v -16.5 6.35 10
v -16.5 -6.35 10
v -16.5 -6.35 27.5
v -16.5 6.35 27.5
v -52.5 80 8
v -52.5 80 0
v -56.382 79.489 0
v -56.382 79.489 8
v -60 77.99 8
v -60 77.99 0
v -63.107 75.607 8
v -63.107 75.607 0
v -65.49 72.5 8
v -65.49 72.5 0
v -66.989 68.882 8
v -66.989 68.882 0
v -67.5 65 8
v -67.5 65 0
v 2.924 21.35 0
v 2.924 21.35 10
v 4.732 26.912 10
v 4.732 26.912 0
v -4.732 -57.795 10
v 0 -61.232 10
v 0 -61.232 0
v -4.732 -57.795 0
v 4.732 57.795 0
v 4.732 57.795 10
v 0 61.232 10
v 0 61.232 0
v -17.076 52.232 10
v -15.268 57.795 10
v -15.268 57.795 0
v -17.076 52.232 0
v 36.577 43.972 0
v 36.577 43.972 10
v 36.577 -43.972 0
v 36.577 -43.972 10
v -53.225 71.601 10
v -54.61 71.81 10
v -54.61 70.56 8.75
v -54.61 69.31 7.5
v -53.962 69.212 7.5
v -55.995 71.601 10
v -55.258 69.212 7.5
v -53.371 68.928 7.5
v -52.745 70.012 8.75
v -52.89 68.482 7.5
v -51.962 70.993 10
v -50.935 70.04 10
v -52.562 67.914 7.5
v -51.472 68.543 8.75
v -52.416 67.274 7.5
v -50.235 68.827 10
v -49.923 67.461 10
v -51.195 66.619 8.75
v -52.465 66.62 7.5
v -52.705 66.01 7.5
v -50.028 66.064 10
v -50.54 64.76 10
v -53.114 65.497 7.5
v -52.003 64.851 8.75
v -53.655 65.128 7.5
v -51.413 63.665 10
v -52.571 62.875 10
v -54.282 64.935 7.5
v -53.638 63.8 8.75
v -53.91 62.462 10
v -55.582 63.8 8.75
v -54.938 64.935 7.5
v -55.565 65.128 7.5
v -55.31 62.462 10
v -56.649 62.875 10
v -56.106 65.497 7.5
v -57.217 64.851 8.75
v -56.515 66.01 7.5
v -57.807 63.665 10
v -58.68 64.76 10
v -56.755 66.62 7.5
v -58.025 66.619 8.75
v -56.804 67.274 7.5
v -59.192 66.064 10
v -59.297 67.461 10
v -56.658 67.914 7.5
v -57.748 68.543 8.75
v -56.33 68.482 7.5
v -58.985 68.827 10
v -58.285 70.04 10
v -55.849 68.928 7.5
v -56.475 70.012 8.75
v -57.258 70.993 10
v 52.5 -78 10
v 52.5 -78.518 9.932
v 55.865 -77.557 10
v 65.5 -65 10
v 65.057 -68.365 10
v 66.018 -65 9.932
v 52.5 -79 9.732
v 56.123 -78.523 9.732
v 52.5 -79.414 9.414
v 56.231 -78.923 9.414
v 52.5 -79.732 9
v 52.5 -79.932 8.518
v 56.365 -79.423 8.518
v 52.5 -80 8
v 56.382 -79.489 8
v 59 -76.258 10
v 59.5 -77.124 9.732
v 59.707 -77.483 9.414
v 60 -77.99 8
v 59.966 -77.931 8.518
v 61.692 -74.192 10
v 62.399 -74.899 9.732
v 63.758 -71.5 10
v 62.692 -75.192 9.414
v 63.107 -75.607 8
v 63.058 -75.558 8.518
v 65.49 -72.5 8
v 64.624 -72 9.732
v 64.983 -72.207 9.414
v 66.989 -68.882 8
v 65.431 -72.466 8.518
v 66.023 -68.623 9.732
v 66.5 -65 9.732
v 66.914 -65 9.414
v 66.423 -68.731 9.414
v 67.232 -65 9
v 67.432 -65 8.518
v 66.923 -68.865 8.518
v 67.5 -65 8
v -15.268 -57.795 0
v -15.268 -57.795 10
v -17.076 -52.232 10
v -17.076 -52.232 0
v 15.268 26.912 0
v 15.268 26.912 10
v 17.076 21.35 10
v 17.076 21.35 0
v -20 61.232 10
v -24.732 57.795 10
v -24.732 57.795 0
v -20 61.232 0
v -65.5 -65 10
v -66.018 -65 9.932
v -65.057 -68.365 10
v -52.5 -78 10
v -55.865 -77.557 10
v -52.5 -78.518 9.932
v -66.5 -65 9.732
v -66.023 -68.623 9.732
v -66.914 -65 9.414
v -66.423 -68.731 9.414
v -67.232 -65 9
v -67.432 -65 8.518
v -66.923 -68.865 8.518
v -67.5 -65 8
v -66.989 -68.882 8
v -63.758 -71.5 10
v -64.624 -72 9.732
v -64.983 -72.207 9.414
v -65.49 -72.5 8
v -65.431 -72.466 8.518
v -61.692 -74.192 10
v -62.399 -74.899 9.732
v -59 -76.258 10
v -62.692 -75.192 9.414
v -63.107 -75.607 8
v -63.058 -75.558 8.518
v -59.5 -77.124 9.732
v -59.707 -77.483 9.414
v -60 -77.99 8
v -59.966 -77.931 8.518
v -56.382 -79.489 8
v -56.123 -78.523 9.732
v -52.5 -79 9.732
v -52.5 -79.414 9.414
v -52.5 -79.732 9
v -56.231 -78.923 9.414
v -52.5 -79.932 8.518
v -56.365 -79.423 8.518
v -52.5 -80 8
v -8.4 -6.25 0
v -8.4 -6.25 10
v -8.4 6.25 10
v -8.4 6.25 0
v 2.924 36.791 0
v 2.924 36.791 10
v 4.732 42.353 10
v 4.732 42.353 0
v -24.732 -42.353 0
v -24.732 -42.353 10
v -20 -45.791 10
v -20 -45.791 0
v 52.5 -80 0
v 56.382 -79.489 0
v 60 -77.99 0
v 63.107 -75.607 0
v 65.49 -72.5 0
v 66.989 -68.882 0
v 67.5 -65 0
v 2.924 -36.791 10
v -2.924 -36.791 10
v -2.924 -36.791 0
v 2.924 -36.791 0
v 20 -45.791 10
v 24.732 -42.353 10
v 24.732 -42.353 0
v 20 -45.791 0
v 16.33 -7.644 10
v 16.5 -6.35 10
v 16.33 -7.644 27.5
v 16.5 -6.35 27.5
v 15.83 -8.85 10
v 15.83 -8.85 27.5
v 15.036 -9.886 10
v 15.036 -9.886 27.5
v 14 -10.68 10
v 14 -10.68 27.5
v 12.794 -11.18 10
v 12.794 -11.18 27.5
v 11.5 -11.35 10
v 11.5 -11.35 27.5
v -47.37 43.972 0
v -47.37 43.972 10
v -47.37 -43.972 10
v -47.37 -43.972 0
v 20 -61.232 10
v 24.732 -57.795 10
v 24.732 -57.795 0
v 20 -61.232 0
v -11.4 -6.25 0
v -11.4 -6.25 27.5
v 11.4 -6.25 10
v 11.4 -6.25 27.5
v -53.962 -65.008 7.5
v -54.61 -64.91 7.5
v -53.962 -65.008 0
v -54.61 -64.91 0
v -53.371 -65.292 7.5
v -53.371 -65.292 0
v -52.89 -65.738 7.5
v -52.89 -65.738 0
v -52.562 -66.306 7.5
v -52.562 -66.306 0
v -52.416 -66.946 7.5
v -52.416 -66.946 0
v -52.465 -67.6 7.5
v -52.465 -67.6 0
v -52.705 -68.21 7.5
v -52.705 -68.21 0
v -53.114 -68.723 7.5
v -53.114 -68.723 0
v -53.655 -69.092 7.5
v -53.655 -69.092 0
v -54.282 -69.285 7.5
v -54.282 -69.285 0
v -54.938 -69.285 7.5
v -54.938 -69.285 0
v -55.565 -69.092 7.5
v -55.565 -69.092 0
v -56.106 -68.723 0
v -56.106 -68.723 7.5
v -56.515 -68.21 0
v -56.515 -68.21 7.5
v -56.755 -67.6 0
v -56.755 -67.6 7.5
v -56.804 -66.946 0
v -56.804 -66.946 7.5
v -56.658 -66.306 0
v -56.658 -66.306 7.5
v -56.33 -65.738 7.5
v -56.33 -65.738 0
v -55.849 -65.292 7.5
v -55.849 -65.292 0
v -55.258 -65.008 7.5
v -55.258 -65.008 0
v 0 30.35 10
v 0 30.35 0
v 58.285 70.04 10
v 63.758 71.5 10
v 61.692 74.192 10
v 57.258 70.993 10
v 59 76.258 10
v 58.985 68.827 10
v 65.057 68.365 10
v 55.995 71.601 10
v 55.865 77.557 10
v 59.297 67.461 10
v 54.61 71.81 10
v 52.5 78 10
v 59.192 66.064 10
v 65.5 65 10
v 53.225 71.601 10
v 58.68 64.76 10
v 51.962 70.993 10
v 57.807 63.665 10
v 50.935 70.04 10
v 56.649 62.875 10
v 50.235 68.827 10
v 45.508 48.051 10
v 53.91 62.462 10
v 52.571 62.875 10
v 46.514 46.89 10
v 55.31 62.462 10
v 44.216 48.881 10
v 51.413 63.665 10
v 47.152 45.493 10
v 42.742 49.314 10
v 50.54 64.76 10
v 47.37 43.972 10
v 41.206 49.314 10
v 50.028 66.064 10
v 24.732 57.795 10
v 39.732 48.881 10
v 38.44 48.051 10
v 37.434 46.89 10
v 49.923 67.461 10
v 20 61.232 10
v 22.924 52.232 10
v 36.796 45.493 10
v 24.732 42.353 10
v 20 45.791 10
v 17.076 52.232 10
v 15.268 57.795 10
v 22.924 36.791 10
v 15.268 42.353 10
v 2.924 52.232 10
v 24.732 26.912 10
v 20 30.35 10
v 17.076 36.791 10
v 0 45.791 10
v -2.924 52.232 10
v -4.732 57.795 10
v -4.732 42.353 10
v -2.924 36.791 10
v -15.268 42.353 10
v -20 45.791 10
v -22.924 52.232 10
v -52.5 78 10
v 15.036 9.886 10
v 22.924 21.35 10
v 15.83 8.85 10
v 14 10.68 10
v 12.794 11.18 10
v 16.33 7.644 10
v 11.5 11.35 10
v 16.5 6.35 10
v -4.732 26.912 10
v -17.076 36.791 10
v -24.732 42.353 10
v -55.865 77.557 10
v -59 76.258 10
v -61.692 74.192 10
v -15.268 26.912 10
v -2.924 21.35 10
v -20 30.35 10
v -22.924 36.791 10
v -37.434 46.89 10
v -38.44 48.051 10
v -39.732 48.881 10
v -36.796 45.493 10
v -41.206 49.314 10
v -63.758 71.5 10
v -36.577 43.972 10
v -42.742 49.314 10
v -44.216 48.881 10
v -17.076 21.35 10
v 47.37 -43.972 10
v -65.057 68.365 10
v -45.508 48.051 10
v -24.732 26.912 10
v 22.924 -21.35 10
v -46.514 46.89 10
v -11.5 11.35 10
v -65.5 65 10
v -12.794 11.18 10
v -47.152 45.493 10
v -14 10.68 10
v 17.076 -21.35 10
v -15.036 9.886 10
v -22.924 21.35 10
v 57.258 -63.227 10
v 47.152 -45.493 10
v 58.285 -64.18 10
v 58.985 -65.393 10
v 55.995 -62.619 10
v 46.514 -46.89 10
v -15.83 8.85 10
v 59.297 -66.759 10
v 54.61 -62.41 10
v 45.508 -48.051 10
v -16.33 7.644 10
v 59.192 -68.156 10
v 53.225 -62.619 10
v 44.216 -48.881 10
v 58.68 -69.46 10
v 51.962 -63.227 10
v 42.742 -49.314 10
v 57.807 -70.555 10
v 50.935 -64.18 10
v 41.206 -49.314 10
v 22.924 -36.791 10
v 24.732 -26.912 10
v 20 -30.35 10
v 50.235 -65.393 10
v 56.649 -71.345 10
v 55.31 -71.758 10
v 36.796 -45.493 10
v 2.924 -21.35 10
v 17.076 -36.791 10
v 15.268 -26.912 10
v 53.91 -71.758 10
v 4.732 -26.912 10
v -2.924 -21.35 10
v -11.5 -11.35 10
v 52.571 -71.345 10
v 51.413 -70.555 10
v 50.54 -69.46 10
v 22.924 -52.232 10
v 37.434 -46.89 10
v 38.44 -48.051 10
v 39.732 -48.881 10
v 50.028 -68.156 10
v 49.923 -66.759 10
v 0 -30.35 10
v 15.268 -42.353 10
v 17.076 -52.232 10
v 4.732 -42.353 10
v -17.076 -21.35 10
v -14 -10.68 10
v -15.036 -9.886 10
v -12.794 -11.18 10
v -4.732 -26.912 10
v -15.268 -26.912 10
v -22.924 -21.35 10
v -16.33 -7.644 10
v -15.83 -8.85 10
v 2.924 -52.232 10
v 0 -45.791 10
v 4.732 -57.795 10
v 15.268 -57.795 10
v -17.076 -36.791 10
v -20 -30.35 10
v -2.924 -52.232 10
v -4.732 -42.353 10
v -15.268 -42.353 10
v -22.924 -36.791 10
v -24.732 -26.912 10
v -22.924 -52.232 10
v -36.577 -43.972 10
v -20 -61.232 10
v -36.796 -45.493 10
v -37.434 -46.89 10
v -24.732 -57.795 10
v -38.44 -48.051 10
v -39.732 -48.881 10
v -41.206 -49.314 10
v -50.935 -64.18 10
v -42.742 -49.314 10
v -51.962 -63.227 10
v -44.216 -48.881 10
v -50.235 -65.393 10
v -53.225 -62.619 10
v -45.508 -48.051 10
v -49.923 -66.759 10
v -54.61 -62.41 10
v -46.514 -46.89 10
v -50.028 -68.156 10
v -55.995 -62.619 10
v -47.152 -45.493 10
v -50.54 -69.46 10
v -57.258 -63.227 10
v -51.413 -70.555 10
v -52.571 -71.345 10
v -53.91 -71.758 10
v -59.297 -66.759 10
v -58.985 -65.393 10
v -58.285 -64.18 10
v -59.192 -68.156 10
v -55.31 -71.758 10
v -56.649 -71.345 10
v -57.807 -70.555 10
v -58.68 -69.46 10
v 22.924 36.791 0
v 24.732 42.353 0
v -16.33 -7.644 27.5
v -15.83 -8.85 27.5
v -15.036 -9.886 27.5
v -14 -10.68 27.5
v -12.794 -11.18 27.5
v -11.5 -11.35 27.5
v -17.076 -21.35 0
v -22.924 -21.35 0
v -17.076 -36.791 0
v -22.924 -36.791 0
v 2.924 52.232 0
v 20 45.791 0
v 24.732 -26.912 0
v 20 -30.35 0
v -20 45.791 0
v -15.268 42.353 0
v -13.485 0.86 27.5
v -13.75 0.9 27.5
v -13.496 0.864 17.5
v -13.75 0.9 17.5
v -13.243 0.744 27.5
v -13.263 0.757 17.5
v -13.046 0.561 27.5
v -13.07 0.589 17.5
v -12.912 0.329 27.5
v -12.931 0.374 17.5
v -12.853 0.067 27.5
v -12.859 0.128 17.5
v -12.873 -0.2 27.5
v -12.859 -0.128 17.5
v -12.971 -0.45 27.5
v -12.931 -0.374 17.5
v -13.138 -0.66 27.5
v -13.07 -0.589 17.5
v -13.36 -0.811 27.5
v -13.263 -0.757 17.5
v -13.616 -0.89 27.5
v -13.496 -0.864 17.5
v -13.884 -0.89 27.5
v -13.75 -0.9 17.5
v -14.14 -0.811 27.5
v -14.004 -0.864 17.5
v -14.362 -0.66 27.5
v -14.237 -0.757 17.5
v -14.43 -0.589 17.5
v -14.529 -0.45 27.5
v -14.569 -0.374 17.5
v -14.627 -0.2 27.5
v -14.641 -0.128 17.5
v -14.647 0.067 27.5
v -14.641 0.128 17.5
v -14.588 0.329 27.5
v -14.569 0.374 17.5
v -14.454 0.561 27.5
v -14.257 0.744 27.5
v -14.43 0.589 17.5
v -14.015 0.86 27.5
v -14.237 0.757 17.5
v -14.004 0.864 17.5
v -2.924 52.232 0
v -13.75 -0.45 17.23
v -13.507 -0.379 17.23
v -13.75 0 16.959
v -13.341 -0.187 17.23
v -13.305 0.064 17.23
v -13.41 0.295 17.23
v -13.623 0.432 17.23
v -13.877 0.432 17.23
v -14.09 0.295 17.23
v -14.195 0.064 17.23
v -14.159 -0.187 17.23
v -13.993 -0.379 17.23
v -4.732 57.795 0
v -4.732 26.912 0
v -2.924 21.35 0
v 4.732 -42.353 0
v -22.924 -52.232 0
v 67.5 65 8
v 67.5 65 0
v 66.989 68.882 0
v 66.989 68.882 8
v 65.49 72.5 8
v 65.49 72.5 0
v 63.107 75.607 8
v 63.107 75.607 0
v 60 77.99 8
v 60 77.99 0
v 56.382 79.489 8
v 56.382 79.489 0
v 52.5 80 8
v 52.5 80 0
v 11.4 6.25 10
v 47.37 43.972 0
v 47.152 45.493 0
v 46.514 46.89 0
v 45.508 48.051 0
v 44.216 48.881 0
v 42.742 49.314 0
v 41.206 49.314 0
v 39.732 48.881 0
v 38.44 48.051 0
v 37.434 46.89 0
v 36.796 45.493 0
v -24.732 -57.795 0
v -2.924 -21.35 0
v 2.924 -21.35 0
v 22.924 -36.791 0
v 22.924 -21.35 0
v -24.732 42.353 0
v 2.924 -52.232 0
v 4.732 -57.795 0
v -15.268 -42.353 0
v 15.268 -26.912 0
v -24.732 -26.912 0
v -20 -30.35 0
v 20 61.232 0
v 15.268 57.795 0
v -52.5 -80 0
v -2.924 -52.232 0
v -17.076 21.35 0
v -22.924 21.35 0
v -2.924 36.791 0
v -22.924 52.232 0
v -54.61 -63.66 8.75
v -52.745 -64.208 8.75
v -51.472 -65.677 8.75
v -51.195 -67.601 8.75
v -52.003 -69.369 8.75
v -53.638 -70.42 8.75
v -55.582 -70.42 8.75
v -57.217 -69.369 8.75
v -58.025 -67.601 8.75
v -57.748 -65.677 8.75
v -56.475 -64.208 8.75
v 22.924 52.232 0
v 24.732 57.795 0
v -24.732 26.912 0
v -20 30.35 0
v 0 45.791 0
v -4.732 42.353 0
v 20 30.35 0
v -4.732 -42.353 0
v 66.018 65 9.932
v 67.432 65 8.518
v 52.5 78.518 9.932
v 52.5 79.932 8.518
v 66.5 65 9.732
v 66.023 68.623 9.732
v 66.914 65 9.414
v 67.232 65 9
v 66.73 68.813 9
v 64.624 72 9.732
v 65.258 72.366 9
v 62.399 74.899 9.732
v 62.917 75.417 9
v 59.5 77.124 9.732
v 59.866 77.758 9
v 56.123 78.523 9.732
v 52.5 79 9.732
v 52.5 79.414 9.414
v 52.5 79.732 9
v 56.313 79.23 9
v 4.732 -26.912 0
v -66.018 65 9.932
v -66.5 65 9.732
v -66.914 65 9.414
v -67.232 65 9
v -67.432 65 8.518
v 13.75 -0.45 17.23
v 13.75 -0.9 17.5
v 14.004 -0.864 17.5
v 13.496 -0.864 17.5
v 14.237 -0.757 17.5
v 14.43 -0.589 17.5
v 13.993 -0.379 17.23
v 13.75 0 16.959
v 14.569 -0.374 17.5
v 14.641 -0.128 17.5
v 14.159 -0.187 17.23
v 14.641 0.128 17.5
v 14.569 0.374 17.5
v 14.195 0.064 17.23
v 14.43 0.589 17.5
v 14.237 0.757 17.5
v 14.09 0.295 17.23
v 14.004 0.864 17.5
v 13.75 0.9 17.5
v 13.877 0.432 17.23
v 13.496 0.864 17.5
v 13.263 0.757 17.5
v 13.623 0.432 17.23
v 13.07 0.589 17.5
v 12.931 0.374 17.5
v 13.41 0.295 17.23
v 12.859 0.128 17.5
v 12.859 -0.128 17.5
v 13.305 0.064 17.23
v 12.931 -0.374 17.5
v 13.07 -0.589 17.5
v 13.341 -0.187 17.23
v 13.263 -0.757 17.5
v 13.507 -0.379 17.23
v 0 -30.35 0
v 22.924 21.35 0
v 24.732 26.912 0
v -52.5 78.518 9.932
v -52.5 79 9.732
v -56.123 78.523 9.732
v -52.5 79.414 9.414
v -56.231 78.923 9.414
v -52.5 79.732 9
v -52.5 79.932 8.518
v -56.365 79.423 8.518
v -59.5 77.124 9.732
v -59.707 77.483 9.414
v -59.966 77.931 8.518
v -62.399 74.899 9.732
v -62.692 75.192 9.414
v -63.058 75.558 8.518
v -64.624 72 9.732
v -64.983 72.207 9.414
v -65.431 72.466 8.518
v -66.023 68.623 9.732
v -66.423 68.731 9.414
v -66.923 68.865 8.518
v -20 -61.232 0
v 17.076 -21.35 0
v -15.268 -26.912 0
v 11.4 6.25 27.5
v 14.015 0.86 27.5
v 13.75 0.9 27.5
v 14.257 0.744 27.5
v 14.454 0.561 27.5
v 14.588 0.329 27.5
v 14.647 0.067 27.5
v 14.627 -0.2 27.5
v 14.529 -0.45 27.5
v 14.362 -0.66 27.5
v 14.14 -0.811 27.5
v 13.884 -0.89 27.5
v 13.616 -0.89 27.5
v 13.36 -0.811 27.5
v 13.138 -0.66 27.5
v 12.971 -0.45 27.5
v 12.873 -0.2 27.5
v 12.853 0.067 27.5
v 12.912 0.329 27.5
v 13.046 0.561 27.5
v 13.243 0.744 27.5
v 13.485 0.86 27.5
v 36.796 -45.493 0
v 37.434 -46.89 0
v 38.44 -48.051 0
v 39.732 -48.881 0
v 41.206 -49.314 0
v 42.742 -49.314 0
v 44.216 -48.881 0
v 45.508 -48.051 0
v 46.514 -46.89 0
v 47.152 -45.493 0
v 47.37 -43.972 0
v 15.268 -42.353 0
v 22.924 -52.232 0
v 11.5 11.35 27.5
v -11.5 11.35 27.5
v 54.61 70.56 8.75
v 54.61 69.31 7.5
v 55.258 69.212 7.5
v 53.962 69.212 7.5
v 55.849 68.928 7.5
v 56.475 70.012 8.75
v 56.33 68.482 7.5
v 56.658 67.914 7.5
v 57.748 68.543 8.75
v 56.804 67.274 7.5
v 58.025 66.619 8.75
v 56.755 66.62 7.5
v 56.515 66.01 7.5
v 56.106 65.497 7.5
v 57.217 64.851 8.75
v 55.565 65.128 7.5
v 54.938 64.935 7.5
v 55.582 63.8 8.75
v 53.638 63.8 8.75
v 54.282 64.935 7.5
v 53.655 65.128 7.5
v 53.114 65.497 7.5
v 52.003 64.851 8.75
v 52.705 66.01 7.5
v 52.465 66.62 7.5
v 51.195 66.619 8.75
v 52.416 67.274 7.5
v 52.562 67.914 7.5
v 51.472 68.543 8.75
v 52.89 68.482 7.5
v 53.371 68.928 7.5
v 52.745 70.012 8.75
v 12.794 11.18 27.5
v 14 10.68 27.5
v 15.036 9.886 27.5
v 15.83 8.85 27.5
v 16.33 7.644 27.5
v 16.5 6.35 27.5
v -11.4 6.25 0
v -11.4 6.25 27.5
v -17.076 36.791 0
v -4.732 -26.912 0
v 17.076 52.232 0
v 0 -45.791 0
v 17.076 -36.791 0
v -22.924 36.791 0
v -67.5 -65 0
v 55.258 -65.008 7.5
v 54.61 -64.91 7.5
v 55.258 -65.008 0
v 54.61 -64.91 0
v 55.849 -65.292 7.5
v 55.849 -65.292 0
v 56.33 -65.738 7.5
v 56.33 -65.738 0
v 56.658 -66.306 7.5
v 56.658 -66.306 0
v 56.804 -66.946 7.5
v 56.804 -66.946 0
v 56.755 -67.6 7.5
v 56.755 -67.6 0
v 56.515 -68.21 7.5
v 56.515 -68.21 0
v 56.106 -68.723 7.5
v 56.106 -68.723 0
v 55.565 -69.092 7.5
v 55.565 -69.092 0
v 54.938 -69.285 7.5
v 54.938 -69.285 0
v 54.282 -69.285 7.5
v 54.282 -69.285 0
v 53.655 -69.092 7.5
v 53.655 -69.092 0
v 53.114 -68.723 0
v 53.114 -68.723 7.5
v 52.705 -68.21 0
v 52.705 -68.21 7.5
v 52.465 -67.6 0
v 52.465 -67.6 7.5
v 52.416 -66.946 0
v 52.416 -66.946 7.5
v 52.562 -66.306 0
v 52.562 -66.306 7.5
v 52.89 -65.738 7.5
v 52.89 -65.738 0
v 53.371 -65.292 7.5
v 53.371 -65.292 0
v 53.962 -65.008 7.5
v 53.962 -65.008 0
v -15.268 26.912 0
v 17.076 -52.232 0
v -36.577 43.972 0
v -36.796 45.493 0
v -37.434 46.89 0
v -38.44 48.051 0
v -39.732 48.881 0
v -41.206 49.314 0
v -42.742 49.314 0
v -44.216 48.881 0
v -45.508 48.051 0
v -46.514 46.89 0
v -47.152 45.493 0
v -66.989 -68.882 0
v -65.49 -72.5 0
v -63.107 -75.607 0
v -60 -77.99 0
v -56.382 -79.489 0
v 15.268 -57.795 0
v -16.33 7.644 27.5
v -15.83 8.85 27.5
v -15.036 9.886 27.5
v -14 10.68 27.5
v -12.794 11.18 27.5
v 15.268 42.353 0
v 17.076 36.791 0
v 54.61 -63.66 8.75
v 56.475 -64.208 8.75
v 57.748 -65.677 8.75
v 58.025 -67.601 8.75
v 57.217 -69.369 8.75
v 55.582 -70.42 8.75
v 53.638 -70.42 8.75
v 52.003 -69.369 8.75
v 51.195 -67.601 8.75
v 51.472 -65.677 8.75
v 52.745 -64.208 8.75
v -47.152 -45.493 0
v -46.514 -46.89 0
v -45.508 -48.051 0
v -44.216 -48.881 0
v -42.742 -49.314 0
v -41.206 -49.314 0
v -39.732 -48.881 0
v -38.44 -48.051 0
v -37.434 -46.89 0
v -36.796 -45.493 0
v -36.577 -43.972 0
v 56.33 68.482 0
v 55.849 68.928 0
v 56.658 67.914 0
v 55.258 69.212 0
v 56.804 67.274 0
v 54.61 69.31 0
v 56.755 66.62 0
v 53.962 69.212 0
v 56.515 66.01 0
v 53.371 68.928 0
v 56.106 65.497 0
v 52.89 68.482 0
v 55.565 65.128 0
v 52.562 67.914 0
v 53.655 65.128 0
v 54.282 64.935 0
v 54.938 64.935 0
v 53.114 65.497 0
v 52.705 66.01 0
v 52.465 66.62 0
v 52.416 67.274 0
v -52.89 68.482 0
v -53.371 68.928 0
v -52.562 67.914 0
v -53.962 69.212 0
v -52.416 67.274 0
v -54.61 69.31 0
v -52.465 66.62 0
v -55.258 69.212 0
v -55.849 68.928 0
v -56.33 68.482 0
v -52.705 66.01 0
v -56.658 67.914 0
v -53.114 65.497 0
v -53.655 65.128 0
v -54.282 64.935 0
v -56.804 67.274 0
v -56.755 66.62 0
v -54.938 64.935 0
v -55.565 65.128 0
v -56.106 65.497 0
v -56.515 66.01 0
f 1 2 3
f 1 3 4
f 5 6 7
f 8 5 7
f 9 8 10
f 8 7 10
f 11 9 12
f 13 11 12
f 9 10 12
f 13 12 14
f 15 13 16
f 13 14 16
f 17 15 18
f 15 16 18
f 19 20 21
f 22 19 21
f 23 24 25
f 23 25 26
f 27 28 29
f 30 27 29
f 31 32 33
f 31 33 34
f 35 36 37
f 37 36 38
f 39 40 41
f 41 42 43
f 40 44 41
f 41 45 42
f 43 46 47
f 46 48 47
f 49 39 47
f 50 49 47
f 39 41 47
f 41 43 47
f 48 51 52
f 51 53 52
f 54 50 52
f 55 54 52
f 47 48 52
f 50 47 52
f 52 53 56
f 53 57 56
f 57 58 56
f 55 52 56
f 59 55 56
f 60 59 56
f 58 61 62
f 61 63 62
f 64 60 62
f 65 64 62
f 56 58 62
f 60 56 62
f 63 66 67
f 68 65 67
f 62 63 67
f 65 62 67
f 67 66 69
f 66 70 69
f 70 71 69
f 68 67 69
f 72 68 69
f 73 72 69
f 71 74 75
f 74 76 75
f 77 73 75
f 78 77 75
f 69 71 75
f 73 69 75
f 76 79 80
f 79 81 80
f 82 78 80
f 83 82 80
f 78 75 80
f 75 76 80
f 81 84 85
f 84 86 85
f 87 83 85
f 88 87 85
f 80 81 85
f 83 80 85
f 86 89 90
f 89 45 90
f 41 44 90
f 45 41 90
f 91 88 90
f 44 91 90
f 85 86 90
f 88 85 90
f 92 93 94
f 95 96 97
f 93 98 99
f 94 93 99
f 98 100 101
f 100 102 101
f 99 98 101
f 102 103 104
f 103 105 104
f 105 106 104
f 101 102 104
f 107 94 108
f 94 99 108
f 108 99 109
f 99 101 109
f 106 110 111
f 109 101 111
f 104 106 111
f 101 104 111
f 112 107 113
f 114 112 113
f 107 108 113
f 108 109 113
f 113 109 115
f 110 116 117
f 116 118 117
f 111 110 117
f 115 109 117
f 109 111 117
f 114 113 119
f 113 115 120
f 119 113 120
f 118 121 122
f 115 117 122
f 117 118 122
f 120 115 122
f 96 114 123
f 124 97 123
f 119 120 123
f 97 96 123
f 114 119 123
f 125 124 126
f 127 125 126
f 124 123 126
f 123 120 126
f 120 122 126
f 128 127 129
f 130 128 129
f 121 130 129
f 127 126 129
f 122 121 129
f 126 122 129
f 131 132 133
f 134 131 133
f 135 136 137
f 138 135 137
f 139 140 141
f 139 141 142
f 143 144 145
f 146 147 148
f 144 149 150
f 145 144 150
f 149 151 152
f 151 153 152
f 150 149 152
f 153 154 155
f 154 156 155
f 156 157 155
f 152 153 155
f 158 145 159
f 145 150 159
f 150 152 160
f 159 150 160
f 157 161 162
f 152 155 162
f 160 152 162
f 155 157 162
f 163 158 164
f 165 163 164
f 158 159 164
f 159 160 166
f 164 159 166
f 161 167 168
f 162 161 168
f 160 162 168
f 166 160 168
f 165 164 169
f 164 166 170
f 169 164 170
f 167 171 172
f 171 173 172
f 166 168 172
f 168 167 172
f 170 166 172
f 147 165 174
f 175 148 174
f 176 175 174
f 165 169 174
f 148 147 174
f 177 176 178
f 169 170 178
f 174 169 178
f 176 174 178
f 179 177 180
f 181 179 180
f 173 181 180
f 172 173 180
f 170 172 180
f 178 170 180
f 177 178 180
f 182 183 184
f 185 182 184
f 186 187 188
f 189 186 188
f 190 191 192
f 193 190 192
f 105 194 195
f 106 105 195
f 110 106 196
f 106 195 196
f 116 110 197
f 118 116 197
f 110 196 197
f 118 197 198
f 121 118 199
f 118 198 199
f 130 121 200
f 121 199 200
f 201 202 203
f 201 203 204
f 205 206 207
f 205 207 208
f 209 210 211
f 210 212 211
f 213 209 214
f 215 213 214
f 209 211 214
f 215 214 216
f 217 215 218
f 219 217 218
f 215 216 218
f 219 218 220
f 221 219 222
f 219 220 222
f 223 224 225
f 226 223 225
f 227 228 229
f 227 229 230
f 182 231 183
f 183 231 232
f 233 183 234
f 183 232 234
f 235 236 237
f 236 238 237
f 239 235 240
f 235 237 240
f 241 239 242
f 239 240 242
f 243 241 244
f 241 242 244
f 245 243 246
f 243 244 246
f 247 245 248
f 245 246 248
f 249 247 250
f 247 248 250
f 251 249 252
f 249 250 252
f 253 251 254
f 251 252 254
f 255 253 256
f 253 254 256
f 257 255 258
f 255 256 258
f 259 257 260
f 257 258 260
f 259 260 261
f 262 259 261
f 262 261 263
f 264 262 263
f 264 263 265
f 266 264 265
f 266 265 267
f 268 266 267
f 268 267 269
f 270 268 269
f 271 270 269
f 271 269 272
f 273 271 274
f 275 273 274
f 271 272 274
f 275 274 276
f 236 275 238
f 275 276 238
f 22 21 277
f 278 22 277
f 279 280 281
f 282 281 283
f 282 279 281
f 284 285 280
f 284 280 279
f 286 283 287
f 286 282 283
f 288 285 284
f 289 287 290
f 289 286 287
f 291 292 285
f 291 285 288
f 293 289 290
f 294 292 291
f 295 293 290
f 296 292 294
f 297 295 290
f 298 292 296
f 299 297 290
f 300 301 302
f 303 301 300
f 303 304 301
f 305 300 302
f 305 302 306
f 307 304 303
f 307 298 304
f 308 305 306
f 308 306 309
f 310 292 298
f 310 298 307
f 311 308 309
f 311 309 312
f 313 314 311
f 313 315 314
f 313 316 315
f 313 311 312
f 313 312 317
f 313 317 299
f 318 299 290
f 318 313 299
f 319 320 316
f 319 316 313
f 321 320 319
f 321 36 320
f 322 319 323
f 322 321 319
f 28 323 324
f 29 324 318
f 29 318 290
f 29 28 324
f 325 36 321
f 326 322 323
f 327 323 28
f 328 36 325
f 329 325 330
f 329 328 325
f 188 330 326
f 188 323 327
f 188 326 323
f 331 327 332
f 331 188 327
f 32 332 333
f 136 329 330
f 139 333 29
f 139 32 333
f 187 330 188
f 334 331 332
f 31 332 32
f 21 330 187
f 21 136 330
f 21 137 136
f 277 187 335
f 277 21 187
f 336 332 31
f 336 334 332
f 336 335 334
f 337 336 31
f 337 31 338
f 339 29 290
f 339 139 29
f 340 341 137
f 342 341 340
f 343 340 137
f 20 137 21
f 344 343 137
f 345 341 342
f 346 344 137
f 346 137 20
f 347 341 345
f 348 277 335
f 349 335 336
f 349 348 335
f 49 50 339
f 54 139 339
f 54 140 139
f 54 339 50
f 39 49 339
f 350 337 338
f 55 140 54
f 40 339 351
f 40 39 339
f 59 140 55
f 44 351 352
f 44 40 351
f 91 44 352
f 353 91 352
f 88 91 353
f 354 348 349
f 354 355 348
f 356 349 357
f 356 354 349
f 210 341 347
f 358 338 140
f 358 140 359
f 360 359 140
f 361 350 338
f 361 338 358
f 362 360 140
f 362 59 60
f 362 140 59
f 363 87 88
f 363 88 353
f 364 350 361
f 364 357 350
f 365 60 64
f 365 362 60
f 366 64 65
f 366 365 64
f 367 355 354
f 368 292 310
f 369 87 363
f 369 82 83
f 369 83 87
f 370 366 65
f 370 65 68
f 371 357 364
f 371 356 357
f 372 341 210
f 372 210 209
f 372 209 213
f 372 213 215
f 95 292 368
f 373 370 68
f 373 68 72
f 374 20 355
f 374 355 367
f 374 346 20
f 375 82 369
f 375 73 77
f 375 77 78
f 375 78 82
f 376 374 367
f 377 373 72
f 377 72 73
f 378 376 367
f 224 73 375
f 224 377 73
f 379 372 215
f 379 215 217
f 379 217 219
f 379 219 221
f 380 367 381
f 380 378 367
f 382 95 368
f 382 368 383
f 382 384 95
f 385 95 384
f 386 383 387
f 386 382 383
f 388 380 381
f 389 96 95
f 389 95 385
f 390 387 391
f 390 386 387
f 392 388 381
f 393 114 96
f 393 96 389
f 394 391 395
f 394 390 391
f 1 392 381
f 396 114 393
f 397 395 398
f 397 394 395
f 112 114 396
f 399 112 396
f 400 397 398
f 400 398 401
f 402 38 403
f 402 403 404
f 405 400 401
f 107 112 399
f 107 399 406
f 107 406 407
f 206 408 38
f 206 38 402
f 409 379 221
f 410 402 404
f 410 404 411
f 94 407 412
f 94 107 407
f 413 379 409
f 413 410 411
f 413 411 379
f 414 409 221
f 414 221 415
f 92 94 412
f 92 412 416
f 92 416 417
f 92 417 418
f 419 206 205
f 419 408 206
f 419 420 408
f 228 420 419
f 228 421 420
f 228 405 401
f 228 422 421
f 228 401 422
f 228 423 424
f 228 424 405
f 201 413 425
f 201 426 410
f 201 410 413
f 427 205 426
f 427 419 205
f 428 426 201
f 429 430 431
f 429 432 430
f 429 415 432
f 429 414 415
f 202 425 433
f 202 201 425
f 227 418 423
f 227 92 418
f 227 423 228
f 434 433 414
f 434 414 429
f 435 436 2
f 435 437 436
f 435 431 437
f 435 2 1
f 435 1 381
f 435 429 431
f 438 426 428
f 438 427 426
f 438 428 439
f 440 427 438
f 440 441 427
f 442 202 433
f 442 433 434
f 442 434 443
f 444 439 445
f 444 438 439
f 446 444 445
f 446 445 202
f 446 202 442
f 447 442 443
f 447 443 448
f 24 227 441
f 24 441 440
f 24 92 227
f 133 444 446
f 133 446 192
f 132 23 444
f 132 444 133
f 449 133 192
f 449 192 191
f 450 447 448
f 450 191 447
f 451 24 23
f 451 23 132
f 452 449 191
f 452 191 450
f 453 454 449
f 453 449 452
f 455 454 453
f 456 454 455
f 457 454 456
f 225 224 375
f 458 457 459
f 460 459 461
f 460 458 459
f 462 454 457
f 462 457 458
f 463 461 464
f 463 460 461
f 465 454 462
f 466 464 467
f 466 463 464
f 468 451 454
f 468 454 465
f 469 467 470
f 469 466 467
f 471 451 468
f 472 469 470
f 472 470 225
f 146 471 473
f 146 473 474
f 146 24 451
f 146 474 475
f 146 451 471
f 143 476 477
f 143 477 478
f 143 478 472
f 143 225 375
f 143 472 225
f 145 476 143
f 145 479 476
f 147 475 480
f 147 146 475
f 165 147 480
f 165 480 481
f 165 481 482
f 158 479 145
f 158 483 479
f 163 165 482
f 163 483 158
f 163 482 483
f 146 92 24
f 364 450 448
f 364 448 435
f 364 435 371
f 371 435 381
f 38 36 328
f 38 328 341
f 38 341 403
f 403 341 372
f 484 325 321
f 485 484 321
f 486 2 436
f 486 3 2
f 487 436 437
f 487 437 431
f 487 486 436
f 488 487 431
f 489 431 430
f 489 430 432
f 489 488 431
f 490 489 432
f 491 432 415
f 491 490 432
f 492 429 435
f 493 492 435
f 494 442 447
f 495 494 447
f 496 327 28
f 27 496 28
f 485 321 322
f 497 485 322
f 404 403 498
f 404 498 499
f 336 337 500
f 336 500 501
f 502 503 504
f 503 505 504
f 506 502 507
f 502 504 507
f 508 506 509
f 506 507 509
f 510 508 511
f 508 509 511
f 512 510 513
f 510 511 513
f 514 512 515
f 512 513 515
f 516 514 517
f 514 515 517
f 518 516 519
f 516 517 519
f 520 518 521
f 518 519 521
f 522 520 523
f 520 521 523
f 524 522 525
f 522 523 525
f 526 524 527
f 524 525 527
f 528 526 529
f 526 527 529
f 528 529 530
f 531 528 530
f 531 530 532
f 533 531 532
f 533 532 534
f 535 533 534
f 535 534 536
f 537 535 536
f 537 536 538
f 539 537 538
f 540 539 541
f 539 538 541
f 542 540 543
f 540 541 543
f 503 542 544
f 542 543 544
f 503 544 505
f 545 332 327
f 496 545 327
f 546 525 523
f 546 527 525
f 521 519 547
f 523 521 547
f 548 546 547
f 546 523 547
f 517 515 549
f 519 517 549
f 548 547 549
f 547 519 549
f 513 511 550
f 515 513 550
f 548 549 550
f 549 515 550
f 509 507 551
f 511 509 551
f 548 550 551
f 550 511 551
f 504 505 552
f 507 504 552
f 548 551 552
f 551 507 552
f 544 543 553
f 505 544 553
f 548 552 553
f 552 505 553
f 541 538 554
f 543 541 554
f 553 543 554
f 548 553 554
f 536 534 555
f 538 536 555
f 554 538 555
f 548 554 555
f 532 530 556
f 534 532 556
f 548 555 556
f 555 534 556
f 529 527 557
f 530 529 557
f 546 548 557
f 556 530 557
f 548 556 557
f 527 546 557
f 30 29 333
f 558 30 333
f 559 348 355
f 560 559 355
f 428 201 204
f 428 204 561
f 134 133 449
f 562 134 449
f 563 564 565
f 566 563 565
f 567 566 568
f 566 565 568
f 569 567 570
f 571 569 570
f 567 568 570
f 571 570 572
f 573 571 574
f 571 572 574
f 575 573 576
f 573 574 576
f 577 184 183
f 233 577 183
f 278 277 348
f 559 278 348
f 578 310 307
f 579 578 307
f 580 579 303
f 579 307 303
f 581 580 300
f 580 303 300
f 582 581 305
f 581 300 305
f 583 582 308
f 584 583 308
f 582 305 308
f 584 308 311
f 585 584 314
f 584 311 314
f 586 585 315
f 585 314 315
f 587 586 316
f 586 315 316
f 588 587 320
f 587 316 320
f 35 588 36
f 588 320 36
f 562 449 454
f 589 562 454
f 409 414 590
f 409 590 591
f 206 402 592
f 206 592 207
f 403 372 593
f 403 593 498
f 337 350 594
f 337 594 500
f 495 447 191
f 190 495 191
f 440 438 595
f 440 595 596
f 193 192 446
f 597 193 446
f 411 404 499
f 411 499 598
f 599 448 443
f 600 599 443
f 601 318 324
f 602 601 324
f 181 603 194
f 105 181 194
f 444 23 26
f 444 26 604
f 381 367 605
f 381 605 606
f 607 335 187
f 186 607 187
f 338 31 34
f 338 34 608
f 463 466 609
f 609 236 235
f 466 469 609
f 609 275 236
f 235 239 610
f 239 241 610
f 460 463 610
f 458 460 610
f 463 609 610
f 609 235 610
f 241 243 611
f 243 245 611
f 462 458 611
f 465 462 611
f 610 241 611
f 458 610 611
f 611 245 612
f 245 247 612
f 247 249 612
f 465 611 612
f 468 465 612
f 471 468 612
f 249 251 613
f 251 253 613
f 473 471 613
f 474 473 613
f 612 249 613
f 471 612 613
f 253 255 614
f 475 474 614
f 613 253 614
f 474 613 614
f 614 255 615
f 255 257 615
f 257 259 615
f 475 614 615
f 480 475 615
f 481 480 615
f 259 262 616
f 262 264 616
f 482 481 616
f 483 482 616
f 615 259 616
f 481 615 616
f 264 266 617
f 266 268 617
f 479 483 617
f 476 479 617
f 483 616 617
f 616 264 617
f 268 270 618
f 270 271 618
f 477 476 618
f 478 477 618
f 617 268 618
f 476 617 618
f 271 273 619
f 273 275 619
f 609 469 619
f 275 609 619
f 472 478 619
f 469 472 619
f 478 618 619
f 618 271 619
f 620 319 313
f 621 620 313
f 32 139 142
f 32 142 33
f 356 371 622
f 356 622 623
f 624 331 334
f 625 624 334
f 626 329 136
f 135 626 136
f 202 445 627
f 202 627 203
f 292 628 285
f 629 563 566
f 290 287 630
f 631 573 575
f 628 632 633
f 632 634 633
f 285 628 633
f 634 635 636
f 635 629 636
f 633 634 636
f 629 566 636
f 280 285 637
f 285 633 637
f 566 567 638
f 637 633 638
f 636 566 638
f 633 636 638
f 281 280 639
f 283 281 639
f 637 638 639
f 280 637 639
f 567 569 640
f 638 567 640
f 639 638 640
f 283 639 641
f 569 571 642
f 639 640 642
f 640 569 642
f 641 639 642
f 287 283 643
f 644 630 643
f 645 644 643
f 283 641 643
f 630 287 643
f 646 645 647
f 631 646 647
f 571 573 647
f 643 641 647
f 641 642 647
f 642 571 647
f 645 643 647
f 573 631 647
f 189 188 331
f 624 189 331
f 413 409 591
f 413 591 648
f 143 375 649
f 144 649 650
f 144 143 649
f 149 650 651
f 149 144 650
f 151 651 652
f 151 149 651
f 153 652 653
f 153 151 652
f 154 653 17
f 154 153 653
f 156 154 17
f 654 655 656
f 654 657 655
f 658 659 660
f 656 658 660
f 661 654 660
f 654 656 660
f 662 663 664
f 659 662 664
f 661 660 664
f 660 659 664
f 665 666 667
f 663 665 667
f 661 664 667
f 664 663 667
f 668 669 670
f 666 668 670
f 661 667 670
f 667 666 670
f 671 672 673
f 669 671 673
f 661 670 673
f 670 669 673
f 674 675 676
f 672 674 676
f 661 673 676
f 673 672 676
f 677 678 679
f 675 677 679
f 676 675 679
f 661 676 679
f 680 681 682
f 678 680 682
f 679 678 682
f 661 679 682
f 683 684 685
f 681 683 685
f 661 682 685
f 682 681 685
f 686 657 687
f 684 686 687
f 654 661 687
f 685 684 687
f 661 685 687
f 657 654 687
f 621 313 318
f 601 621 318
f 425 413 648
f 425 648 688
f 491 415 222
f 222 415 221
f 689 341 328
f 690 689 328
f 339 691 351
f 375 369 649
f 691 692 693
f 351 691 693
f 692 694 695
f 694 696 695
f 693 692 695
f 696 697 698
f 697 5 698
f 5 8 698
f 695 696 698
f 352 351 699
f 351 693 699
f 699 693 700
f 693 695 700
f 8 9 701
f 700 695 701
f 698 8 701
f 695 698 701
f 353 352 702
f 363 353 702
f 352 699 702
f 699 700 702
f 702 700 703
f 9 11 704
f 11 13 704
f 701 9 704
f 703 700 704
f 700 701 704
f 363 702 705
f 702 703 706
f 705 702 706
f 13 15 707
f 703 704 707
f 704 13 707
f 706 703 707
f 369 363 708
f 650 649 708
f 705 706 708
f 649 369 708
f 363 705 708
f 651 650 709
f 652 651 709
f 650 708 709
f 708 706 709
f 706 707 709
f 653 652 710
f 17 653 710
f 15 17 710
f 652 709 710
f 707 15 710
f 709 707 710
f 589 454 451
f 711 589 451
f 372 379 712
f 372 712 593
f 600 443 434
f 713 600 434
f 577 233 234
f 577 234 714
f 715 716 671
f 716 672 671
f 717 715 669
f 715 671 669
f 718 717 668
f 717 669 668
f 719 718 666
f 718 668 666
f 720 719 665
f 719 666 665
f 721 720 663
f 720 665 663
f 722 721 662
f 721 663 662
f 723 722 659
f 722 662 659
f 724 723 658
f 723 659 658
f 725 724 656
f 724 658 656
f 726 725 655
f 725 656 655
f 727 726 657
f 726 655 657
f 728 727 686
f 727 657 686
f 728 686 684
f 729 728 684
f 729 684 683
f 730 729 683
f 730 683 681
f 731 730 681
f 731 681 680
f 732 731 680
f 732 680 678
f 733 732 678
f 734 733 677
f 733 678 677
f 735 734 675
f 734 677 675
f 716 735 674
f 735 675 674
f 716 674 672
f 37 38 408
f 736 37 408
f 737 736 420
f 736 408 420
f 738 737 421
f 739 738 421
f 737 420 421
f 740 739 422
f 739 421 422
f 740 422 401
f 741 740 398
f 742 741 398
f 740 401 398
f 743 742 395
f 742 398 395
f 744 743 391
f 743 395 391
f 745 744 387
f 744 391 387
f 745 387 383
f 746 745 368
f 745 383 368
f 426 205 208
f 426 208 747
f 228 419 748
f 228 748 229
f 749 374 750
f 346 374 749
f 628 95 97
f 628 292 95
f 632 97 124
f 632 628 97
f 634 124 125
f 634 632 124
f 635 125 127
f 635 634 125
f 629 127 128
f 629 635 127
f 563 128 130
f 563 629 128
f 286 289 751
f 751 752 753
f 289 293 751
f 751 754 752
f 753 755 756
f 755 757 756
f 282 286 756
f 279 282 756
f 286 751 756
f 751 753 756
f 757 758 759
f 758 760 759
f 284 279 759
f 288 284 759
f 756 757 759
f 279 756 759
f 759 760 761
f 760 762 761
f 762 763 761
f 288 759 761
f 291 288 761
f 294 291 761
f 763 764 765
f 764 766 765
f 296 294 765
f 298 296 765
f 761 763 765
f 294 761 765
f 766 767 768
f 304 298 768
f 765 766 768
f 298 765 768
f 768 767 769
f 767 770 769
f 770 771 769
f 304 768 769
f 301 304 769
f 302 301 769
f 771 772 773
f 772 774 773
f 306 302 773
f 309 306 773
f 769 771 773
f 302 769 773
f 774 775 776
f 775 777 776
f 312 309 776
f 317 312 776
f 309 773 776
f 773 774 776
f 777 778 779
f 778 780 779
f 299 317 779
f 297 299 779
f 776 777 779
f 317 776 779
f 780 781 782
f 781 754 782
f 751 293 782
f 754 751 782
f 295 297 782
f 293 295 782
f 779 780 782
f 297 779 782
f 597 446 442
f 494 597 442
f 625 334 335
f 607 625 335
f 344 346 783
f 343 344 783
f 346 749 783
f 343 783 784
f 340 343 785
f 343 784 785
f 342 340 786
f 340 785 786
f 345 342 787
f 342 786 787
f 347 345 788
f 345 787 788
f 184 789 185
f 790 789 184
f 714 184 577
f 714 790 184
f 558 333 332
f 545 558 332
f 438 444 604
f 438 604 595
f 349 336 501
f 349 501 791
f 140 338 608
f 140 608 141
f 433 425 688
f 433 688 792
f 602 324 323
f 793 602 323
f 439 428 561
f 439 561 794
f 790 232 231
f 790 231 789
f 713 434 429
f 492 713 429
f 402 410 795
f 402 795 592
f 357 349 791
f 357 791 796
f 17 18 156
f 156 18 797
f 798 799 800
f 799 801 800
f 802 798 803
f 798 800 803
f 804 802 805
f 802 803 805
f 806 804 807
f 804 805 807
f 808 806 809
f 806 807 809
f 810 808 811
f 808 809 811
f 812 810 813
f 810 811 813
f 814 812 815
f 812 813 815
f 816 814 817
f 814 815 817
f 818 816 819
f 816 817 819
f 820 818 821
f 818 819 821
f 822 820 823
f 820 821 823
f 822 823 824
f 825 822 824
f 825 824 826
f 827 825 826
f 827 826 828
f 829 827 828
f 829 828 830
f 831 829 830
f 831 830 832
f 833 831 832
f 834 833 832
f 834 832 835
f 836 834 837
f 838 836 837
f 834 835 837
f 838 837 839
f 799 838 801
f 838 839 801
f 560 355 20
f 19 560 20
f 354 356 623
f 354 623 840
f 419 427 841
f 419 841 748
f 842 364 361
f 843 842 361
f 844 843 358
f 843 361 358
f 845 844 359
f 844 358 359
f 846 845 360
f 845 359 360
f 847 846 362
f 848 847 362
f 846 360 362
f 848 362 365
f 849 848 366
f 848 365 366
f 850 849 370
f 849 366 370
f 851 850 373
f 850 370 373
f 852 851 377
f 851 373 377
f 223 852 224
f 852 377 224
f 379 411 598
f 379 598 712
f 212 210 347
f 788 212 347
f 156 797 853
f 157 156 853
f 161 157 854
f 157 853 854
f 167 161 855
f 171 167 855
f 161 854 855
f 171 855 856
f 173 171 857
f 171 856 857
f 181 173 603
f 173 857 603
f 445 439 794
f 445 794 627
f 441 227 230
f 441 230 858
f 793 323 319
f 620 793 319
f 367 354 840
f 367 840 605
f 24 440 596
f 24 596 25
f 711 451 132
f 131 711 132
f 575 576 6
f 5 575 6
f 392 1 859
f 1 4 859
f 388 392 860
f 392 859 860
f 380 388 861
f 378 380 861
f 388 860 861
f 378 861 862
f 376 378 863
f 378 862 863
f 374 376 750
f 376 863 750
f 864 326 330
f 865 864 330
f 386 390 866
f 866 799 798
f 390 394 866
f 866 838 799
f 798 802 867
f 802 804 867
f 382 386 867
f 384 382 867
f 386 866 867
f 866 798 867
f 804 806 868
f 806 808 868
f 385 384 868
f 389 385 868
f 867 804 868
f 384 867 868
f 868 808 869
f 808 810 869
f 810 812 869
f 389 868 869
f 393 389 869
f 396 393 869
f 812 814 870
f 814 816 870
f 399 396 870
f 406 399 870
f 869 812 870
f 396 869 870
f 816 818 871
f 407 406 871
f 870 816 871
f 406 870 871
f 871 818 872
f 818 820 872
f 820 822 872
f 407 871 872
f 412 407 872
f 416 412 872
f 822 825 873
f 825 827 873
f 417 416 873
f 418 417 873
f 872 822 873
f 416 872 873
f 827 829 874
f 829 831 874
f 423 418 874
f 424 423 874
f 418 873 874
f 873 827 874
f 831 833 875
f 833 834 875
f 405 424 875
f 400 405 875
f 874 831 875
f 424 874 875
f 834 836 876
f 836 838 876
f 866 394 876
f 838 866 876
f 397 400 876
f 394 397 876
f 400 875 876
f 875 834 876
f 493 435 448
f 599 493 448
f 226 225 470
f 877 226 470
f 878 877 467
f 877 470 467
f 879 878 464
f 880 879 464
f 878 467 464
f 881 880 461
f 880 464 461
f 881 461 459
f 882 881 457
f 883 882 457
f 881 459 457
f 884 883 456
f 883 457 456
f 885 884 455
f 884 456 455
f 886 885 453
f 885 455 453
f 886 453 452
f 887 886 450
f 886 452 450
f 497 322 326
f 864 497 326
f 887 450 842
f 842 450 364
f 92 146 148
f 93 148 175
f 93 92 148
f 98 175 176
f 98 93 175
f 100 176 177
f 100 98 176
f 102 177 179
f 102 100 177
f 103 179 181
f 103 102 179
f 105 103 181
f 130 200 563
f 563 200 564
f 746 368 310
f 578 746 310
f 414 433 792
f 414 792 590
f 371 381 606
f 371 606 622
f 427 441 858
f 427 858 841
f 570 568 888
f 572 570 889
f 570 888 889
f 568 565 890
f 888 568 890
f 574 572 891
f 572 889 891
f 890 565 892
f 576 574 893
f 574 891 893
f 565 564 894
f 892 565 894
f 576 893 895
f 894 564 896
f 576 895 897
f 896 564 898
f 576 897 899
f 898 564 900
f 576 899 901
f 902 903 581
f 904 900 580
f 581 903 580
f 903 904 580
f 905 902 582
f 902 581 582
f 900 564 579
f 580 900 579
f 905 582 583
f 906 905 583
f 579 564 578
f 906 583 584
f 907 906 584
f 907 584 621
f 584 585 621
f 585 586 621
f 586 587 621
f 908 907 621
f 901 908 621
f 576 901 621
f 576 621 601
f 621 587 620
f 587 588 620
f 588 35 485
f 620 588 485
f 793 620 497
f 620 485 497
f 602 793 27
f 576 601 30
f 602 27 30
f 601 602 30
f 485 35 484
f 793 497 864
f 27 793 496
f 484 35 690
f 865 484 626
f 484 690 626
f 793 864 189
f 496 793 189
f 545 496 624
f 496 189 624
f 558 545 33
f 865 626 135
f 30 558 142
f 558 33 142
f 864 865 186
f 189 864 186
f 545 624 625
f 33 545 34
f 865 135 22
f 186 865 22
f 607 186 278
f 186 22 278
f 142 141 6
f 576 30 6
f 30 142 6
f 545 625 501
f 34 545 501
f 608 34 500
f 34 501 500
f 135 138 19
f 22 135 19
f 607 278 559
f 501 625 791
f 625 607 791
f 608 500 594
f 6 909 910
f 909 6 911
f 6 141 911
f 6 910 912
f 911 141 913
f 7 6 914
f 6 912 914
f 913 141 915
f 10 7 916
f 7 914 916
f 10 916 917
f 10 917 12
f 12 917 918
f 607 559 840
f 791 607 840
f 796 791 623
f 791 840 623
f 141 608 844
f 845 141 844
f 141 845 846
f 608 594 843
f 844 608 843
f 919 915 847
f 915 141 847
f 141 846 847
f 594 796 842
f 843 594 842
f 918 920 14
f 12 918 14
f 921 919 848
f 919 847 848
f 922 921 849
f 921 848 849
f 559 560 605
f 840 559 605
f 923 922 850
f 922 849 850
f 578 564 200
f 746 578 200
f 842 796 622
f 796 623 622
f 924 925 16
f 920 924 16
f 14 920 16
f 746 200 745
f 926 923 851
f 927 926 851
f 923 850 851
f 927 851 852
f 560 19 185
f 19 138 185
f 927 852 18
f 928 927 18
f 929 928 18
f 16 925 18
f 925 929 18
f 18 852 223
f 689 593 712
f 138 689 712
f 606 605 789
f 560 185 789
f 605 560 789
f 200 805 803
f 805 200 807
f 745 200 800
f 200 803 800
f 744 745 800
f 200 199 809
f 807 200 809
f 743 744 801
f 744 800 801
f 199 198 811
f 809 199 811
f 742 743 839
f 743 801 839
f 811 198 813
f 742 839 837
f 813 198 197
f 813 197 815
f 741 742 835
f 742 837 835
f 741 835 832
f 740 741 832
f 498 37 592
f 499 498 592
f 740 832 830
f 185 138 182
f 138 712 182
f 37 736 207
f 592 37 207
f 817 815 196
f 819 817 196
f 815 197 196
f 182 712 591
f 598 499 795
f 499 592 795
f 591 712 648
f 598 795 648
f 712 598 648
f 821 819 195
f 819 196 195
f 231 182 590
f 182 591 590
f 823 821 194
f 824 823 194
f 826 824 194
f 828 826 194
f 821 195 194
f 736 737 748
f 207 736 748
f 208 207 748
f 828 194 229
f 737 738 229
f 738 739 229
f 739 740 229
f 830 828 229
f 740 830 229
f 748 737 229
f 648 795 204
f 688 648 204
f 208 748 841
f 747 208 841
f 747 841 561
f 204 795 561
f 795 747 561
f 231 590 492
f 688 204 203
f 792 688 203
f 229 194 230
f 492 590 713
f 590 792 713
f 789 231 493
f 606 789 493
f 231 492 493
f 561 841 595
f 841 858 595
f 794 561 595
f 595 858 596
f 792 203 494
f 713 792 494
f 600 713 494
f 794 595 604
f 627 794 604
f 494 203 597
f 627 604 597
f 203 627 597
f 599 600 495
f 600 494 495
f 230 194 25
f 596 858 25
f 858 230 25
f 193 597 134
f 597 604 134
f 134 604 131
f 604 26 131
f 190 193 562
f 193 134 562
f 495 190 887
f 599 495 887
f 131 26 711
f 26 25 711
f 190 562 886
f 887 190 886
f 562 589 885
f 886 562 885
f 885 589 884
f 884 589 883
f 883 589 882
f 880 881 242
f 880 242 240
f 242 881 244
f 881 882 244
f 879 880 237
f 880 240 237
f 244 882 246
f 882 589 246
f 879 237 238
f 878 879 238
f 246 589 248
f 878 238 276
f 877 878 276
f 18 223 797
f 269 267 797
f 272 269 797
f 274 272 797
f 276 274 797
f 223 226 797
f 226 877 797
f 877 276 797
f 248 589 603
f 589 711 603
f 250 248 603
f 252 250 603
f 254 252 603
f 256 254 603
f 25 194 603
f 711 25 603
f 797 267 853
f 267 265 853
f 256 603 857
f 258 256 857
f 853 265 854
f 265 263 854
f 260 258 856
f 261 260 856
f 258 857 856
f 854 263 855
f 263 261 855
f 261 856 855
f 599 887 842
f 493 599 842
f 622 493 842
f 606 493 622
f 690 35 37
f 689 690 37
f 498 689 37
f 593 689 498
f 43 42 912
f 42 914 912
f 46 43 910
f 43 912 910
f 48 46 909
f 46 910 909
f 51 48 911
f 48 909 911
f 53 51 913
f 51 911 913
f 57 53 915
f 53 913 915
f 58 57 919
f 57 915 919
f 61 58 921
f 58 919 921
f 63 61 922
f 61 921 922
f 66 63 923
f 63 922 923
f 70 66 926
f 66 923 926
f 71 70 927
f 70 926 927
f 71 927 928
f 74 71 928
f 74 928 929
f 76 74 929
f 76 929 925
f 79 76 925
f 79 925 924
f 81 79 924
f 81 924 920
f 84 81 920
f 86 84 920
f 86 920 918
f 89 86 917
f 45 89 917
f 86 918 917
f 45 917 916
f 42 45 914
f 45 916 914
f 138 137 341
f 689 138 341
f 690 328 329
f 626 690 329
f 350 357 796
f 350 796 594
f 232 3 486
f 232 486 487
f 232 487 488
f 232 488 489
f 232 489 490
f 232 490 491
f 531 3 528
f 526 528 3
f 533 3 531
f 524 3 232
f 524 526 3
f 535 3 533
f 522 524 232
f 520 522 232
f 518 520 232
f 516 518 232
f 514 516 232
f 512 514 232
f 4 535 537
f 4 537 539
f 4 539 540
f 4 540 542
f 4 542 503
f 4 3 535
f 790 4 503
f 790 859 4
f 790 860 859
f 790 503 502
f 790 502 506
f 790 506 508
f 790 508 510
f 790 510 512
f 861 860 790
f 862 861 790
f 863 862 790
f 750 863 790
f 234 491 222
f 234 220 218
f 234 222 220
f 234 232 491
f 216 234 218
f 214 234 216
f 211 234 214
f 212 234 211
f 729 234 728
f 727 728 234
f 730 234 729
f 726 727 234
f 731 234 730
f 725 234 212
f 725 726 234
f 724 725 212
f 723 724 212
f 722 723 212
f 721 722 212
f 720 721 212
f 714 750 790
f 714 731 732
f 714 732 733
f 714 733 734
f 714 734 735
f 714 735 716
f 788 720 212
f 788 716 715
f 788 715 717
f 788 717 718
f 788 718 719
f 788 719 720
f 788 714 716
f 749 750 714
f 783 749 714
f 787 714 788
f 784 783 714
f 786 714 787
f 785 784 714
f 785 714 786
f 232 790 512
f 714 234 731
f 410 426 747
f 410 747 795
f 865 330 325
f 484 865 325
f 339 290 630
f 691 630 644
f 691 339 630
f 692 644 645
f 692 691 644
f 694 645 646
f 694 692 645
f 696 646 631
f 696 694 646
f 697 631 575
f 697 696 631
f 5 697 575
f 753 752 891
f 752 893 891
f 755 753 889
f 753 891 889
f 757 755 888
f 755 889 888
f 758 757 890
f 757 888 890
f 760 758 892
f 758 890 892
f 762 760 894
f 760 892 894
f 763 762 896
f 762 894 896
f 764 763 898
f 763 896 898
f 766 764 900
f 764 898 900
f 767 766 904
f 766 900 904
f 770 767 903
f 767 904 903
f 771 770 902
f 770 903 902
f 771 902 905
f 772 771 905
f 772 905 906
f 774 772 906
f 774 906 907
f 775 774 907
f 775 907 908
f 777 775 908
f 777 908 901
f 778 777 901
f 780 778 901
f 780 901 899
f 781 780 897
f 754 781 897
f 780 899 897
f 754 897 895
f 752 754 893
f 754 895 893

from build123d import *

# Parameters (mm, degrees)
BOSS_EXTRUDE1_DEPTH                                 = 10
CSK_FOR_M4_COUNTERSUNK_FLAT_HEAD_SCREW1_D           = 4.4
CSK_FOR_M4_COUNTERSUNK_FLAT_HEAD_SCREW1_DEPTH       = 10
CSK_FOR_M4_COUNTERSUNK_FLAT_HEAD_SCREW1_CSINK_D     = 9.4
CSK_FOR_M4_COUNTERSUNK_FLAT_HEAD_SCREW1_CSINK_ANGLE = 90
CSK_FOR_M4_COUNTERSUNK_FLAT_HEAD_SCREW1_TIP         = 1.321893362
SKETCH4_W                                           = 33
SKETCH4_H                                           = 22.7
SKETCH4_W_2                                         = 22.8
SKETCH4_H_2                                         = 12.5
EXTRUDE_THIN1_DEPTH                                 = 17.5
FILLET1_R                                           = 5
F_1_5MM_DOWEL_HOLE1_D                               = 1.8
F_1_5MM_DOWEL_HOLE1_DEPTH                           = 10
F_1_5MM_DOWEL_HOLE1_TIP                             = 0.540774557
SKETCH8_W                                           = 3
SKETCH8_H                                           = 12.5
CUT_EXTRUDE1_DEPTH                                  = 100.184172124
BOSS_EXTRUDE3_DEPTH                                 = 10
FILLET2_R                                           = 2


with BuildPart() as part:
    # Sketch1 → Boss-Extrude1 (new body)
    with BuildSketch(Plane(origin=(0, 0, 0), x_dir=(0, 1, 0), z_dir=(0, 0, 1))):
        with BuildLine():
            Line((-60, 62.5), (60, 62.5))
            ThreePointArc((60, 62.5), (70.606601718, 58.106601718), (75, 47.5))
            Line((75, 47.5), (75, -47.5))
            ThreePointArc((75, -47.5), (70.606601718, -58.106601718), (60, -62.5))
            Line((60, -62.5), (-60, -62.5))
            ThreePointArc((-60, -62.5), (-70.606601718, -58.106601718), (-75, -47.5))
            Line((-75, -47.5), (-75, 47.5))
            ThreePointArc((-75, 47.5), (-70.606601718, 58.106601718), (-60, 62.5))
        make_face()
    extrude(amount=BOSS_EXTRUDE1_DEPTH)

    # CSK for M4 Countersunk Flat Head Screw1
    with Locations(Plane(origin=(0, 0, 10), x_dir=(0, -1, 0), z_dir=(0, 0, 1))):
        with Locations((-67.11, 54.61), (67.11, 54.61), (67.11, -54.61), (-67.11, -54.61)):
            CounterSinkHole(CSK_FOR_M4_COUNTERSUNK_FLAT_HEAD_SCREW1_D / 2, CSK_FOR_M4_COUNTERSUNK_FLAT_HEAD_SCREW1_CSINK_D / 2, depth=CSK_FOR_M4_COUNTERSUNK_FLAT_HEAD_SCREW1_DEPTH, counter_sink_angle=CSK_FOR_M4_COUNTERSUNK_FLAT_HEAD_SCREW1_CSINK_ANGLE)
            with Locations((0, 0, -(CSK_FOR_M4_COUNTERSUNK_FLAT_HEAD_SCREW1_DEPTH + CSK_FOR_M4_COUNTERSUNK_FLAT_HEAD_SCREW1_TIP / 2))):  # 118° drill point
                Cone(0, CSK_FOR_M4_COUNTERSUNK_FLAT_HEAD_SCREW1_D / 2, CSK_FOR_M4_COUNTERSUNK_FLAT_HEAD_SCREW1_TIP, mode=Mode.SUBTRACT)

    # Sketch4 → Extrude-Thin1 (add)
    with BuildSketch(Plane.XY.offset(10)):
        Rectangle(SKETCH4_W, SKETCH4_H)
        Rectangle(SKETCH4_W_2, SKETCH4_H_2, mode=Mode.SUBTRACT)
    extrude(amount=EXTRUDE_THIN1_DEPTH)

    # Fillet1
    fillet1_edges = [part.edges().sort_by_distance(p)[0] for p in [
        (16.5, -11.35, 18.75),
        (16.5, 11.35, 18.75),
        (-16.5, 11.35, 18.75),
        (-16.5, -11.35, 18.75),
    ]]
    fillet(fillet1_edges, radius=FILLET1_R)

    # Ø1.5mm Dowel Hole1
    with Locations(Plane(origin=(0, 0, 27.5), x_dir=(0, -1, 0), z_dir=(0, 0, 1))):
        with Locations((0, -13.75), (0, 13.75)):
            Hole(F_1_5MM_DOWEL_HOLE1_D / 2, depth=F_1_5MM_DOWEL_HOLE1_DEPTH)
            with Locations((0, 0, -(F_1_5MM_DOWEL_HOLE1_DEPTH + F_1_5MM_DOWEL_HOLE1_TIP / 2))):  # 118° drill point
                Cone(0, F_1_5MM_DOWEL_HOLE1_D / 2, F_1_5MM_DOWEL_HOLE1_TIP, mode=Mode.SUBTRACT)

    # Sketch8 → Cut-Extrude1 (cut, through all)
    with BuildSketch(Plane.XY.offset(10)):
        with BuildLine():
            Line((-47.370334328, 43.972462246), (-47.370334328, -43.972462246))
            ThreePointArc((-47.370334328, -43.972462246), (-41.973713961, -49.369082612), (-36.577093595, -43.972462245))
            Line((-36.577093595, -43.972462245), (-36.577093595, 43.972462246))
            ThreePointArc((-36.577093595, 43.972462246), (-41.973713962, 49.369082612), (-47.370334328, 43.972462246))
        make_face()
        with BuildLine():
            Line((36.577093595, 43.972462246), (36.577093595, -43.972462245))
            ThreePointArc((36.577093595, -43.972462245), (41.973713961, -49.369082612), (47.370334328, -43.972462246))
            Line((47.370334328, -43.972462246), (47.370334328, 43.972462246))
            ThreePointArc((47.370334328, 43.972462246), (41.973713962, 49.369082612), (36.577093595, 43.972462246))
        make_face()
        Polygon((20, 61.232201212), (15.268419991, 57.794507111), (17.075722734, 52.232201212), (22.924277266, 52.232201212), (24.731580009, 57.794507111), align=None)
        Polygon((0, 61.232201212), (-4.731580009, 57.794507111), (-2.924277266, 52.232201212), (2.924277266, 52.232201212), (4.731580009, 57.794507111), align=None)
        with Locations((-9.9, 0)):
            Rectangle(SKETCH8_W, SKETCH8_H)
        Polygon((20, 45.791100606), (15.268419991, 42.353406505), (17.075722734, 36.791100606), (22.924277266, 36.791100606), (24.731580009, 42.353406505), align=None)
        Polygon((20, 30.35), (15.268419991, 26.912305899), (17.075722734, 21.35), (22.924277266, 21.35), (24.731580009, 26.912305899), align=None)
        Polygon((0, 45.791100606), (-4.731580009, 42.353406505), (-2.924277266, 36.791100606), (2.924277266, 36.791100606), (4.731580009, 42.353406505), align=None)
        Polygon((0, 30.35), (-4.731580009, 26.912305899), (-2.924277266, 21.35), (2.924277266, 21.35), (4.731580009, 26.912305899), align=None)
        Polygon((-24.731580009, 26.912305899), (-20, 30.35), (-15.268419991, 26.912305899), (-17.075722734, 21.35), (-22.924277266, 21.35), align=None)
        Polygon((-24.731580009, 42.353406505), (-20, 45.791100606), (-15.268419991, 42.353406505), (-17.075722734, 36.791100606), (-22.924277266, 36.791100606), align=None)
        Polygon((-24.731580009, 57.794507111), (-20, 61.232201212), (-15.268419991, 57.794507111), (-17.075722734, 52.232201212), (-22.924277266, 52.232201212), align=None)
        Polygon((24.731580009, -26.912305899), (20, -30.35), (15.268419991, -26.912305899), (17.075722734, -21.35), (22.924277266, -21.35), align=None)
        Polygon((4.731580009, -26.912305899), (0, -30.35), (-4.731580009, -26.912305899), (-2.924277266, -21.35), (2.924277266, -21.35), align=None)
        Polygon((-22.924277266, -21.35), (-24.731580009, -26.912305899), (-20, -30.35), (-15.268419991, -26.912305899), (-17.075722734, -21.35), align=None)
        Polygon((-22.924277266, -36.791100606), (-24.731580009, -42.353406505), (-20, -45.791100606), (-15.268419991, -42.353406505), (-17.075722734, -36.791100606), align=None)
        Polygon((4.731580009, -42.353406505), (0, -45.791100606), (-4.731580009, -42.353406505), (-2.924277266, -36.791100606), (2.924277266, -36.791100606), align=None)
        Polygon((24.731580009, -42.353406505), (20, -45.791100606), (15.268419991, -42.353406505), (17.075722734, -36.791100606), (22.924277266, -36.791100606), align=None)
        Polygon((24.731580009, -57.794507111), (20, -61.232201212), (15.268419991, -57.794507111), (17.075722734, -52.232201212), (22.924277266, -52.232201212), align=None)
        Polygon((4.731580009, -57.794507111), (0, -61.232201212), (-4.731580009, -57.794507111), (-2.924277266, -52.232201212), (2.924277266, -52.232201212), align=None)
        Polygon((-22.924277266, -52.232201212), (-24.731580009, -57.794507111), (-20, -61.232201212), (-15.268419991, -57.794507111), (-17.075722734, -52.232201212), align=None)
    extrude(amount=-CUT_EXTRUDE1_DEPTH, mode=Mode.SUBTRACT)

    # Sketch9 → Boss-Extrude3 (add)
    with BuildSketch(Plane(origin=(0, 0, 0), x_dir=(1, 0, 0), z_dir=(0, 0, -1))):
        with BuildLine():
            Line((-52.5, 80), (52.5, 80))
            ThreePointArc((52.5, 80), (63.106601718, 75.606601718), (67.5, 65))
            Line((67.5, 65), (67.5, -65))
            ThreePointArc((67.5, -65), (63.106601718, -75.606601718), (52.5, -80))
            Line((52.5, -80), (-52.5, -80))
            ThreePointArc((-52.5, -80), (-63.106601718, -75.606601718), (-67.5, -65))
            Line((-67.5, -65), (-67.5, 65))
            ThreePointArc((-67.5, 65), (-63.106601718, 75.606601718), (-52.5, 80))
        make_face()
        with BuildLine():
            Line((-47.5, 75), (47.5, 75))
            ThreePointArc((47.5, 75), (58.106601718, 70.606601718), (62.5, 60))
            Line((62.5, 60), (62.5, -60))
            ThreePointArc((62.5, -60), (58.106601718, -70.606601718), (47.5, -75))
            Line((47.5, -75), (-47.5, -75))
            ThreePointArc((-47.5, -75), (-58.106601718, -70.606601718), (-62.5, -60))
            Line((-62.5, -60), (-62.5, 60))
            ThreePointArc((-62.5, 60), (-58.106601718, 70.606601718), (-47.5, 75))
        make_face(mode=Mode.SUBTRACT)
    extrude(amount=-BOSS_EXTRUDE3_DEPTH)

    # Fillet2
    fillet2_edges = [part.edges().sort_by_distance(p)[0] for p in [
        (63.106601718, 75.606601718, 10),
        (0, 80, 10),
        (-63.106601718, 75.606601718, 10),
        (-67.5, 0, 10),
        (-63.106601718, -75.606601718, 10),
        (0, -80, 10),
        (63.106601718, -75.606601718, 10),
        (67.5, 0, 10),
    ]]
    fillet(fillet2_edges, radius=FILLET2_R)


solid = part.part
